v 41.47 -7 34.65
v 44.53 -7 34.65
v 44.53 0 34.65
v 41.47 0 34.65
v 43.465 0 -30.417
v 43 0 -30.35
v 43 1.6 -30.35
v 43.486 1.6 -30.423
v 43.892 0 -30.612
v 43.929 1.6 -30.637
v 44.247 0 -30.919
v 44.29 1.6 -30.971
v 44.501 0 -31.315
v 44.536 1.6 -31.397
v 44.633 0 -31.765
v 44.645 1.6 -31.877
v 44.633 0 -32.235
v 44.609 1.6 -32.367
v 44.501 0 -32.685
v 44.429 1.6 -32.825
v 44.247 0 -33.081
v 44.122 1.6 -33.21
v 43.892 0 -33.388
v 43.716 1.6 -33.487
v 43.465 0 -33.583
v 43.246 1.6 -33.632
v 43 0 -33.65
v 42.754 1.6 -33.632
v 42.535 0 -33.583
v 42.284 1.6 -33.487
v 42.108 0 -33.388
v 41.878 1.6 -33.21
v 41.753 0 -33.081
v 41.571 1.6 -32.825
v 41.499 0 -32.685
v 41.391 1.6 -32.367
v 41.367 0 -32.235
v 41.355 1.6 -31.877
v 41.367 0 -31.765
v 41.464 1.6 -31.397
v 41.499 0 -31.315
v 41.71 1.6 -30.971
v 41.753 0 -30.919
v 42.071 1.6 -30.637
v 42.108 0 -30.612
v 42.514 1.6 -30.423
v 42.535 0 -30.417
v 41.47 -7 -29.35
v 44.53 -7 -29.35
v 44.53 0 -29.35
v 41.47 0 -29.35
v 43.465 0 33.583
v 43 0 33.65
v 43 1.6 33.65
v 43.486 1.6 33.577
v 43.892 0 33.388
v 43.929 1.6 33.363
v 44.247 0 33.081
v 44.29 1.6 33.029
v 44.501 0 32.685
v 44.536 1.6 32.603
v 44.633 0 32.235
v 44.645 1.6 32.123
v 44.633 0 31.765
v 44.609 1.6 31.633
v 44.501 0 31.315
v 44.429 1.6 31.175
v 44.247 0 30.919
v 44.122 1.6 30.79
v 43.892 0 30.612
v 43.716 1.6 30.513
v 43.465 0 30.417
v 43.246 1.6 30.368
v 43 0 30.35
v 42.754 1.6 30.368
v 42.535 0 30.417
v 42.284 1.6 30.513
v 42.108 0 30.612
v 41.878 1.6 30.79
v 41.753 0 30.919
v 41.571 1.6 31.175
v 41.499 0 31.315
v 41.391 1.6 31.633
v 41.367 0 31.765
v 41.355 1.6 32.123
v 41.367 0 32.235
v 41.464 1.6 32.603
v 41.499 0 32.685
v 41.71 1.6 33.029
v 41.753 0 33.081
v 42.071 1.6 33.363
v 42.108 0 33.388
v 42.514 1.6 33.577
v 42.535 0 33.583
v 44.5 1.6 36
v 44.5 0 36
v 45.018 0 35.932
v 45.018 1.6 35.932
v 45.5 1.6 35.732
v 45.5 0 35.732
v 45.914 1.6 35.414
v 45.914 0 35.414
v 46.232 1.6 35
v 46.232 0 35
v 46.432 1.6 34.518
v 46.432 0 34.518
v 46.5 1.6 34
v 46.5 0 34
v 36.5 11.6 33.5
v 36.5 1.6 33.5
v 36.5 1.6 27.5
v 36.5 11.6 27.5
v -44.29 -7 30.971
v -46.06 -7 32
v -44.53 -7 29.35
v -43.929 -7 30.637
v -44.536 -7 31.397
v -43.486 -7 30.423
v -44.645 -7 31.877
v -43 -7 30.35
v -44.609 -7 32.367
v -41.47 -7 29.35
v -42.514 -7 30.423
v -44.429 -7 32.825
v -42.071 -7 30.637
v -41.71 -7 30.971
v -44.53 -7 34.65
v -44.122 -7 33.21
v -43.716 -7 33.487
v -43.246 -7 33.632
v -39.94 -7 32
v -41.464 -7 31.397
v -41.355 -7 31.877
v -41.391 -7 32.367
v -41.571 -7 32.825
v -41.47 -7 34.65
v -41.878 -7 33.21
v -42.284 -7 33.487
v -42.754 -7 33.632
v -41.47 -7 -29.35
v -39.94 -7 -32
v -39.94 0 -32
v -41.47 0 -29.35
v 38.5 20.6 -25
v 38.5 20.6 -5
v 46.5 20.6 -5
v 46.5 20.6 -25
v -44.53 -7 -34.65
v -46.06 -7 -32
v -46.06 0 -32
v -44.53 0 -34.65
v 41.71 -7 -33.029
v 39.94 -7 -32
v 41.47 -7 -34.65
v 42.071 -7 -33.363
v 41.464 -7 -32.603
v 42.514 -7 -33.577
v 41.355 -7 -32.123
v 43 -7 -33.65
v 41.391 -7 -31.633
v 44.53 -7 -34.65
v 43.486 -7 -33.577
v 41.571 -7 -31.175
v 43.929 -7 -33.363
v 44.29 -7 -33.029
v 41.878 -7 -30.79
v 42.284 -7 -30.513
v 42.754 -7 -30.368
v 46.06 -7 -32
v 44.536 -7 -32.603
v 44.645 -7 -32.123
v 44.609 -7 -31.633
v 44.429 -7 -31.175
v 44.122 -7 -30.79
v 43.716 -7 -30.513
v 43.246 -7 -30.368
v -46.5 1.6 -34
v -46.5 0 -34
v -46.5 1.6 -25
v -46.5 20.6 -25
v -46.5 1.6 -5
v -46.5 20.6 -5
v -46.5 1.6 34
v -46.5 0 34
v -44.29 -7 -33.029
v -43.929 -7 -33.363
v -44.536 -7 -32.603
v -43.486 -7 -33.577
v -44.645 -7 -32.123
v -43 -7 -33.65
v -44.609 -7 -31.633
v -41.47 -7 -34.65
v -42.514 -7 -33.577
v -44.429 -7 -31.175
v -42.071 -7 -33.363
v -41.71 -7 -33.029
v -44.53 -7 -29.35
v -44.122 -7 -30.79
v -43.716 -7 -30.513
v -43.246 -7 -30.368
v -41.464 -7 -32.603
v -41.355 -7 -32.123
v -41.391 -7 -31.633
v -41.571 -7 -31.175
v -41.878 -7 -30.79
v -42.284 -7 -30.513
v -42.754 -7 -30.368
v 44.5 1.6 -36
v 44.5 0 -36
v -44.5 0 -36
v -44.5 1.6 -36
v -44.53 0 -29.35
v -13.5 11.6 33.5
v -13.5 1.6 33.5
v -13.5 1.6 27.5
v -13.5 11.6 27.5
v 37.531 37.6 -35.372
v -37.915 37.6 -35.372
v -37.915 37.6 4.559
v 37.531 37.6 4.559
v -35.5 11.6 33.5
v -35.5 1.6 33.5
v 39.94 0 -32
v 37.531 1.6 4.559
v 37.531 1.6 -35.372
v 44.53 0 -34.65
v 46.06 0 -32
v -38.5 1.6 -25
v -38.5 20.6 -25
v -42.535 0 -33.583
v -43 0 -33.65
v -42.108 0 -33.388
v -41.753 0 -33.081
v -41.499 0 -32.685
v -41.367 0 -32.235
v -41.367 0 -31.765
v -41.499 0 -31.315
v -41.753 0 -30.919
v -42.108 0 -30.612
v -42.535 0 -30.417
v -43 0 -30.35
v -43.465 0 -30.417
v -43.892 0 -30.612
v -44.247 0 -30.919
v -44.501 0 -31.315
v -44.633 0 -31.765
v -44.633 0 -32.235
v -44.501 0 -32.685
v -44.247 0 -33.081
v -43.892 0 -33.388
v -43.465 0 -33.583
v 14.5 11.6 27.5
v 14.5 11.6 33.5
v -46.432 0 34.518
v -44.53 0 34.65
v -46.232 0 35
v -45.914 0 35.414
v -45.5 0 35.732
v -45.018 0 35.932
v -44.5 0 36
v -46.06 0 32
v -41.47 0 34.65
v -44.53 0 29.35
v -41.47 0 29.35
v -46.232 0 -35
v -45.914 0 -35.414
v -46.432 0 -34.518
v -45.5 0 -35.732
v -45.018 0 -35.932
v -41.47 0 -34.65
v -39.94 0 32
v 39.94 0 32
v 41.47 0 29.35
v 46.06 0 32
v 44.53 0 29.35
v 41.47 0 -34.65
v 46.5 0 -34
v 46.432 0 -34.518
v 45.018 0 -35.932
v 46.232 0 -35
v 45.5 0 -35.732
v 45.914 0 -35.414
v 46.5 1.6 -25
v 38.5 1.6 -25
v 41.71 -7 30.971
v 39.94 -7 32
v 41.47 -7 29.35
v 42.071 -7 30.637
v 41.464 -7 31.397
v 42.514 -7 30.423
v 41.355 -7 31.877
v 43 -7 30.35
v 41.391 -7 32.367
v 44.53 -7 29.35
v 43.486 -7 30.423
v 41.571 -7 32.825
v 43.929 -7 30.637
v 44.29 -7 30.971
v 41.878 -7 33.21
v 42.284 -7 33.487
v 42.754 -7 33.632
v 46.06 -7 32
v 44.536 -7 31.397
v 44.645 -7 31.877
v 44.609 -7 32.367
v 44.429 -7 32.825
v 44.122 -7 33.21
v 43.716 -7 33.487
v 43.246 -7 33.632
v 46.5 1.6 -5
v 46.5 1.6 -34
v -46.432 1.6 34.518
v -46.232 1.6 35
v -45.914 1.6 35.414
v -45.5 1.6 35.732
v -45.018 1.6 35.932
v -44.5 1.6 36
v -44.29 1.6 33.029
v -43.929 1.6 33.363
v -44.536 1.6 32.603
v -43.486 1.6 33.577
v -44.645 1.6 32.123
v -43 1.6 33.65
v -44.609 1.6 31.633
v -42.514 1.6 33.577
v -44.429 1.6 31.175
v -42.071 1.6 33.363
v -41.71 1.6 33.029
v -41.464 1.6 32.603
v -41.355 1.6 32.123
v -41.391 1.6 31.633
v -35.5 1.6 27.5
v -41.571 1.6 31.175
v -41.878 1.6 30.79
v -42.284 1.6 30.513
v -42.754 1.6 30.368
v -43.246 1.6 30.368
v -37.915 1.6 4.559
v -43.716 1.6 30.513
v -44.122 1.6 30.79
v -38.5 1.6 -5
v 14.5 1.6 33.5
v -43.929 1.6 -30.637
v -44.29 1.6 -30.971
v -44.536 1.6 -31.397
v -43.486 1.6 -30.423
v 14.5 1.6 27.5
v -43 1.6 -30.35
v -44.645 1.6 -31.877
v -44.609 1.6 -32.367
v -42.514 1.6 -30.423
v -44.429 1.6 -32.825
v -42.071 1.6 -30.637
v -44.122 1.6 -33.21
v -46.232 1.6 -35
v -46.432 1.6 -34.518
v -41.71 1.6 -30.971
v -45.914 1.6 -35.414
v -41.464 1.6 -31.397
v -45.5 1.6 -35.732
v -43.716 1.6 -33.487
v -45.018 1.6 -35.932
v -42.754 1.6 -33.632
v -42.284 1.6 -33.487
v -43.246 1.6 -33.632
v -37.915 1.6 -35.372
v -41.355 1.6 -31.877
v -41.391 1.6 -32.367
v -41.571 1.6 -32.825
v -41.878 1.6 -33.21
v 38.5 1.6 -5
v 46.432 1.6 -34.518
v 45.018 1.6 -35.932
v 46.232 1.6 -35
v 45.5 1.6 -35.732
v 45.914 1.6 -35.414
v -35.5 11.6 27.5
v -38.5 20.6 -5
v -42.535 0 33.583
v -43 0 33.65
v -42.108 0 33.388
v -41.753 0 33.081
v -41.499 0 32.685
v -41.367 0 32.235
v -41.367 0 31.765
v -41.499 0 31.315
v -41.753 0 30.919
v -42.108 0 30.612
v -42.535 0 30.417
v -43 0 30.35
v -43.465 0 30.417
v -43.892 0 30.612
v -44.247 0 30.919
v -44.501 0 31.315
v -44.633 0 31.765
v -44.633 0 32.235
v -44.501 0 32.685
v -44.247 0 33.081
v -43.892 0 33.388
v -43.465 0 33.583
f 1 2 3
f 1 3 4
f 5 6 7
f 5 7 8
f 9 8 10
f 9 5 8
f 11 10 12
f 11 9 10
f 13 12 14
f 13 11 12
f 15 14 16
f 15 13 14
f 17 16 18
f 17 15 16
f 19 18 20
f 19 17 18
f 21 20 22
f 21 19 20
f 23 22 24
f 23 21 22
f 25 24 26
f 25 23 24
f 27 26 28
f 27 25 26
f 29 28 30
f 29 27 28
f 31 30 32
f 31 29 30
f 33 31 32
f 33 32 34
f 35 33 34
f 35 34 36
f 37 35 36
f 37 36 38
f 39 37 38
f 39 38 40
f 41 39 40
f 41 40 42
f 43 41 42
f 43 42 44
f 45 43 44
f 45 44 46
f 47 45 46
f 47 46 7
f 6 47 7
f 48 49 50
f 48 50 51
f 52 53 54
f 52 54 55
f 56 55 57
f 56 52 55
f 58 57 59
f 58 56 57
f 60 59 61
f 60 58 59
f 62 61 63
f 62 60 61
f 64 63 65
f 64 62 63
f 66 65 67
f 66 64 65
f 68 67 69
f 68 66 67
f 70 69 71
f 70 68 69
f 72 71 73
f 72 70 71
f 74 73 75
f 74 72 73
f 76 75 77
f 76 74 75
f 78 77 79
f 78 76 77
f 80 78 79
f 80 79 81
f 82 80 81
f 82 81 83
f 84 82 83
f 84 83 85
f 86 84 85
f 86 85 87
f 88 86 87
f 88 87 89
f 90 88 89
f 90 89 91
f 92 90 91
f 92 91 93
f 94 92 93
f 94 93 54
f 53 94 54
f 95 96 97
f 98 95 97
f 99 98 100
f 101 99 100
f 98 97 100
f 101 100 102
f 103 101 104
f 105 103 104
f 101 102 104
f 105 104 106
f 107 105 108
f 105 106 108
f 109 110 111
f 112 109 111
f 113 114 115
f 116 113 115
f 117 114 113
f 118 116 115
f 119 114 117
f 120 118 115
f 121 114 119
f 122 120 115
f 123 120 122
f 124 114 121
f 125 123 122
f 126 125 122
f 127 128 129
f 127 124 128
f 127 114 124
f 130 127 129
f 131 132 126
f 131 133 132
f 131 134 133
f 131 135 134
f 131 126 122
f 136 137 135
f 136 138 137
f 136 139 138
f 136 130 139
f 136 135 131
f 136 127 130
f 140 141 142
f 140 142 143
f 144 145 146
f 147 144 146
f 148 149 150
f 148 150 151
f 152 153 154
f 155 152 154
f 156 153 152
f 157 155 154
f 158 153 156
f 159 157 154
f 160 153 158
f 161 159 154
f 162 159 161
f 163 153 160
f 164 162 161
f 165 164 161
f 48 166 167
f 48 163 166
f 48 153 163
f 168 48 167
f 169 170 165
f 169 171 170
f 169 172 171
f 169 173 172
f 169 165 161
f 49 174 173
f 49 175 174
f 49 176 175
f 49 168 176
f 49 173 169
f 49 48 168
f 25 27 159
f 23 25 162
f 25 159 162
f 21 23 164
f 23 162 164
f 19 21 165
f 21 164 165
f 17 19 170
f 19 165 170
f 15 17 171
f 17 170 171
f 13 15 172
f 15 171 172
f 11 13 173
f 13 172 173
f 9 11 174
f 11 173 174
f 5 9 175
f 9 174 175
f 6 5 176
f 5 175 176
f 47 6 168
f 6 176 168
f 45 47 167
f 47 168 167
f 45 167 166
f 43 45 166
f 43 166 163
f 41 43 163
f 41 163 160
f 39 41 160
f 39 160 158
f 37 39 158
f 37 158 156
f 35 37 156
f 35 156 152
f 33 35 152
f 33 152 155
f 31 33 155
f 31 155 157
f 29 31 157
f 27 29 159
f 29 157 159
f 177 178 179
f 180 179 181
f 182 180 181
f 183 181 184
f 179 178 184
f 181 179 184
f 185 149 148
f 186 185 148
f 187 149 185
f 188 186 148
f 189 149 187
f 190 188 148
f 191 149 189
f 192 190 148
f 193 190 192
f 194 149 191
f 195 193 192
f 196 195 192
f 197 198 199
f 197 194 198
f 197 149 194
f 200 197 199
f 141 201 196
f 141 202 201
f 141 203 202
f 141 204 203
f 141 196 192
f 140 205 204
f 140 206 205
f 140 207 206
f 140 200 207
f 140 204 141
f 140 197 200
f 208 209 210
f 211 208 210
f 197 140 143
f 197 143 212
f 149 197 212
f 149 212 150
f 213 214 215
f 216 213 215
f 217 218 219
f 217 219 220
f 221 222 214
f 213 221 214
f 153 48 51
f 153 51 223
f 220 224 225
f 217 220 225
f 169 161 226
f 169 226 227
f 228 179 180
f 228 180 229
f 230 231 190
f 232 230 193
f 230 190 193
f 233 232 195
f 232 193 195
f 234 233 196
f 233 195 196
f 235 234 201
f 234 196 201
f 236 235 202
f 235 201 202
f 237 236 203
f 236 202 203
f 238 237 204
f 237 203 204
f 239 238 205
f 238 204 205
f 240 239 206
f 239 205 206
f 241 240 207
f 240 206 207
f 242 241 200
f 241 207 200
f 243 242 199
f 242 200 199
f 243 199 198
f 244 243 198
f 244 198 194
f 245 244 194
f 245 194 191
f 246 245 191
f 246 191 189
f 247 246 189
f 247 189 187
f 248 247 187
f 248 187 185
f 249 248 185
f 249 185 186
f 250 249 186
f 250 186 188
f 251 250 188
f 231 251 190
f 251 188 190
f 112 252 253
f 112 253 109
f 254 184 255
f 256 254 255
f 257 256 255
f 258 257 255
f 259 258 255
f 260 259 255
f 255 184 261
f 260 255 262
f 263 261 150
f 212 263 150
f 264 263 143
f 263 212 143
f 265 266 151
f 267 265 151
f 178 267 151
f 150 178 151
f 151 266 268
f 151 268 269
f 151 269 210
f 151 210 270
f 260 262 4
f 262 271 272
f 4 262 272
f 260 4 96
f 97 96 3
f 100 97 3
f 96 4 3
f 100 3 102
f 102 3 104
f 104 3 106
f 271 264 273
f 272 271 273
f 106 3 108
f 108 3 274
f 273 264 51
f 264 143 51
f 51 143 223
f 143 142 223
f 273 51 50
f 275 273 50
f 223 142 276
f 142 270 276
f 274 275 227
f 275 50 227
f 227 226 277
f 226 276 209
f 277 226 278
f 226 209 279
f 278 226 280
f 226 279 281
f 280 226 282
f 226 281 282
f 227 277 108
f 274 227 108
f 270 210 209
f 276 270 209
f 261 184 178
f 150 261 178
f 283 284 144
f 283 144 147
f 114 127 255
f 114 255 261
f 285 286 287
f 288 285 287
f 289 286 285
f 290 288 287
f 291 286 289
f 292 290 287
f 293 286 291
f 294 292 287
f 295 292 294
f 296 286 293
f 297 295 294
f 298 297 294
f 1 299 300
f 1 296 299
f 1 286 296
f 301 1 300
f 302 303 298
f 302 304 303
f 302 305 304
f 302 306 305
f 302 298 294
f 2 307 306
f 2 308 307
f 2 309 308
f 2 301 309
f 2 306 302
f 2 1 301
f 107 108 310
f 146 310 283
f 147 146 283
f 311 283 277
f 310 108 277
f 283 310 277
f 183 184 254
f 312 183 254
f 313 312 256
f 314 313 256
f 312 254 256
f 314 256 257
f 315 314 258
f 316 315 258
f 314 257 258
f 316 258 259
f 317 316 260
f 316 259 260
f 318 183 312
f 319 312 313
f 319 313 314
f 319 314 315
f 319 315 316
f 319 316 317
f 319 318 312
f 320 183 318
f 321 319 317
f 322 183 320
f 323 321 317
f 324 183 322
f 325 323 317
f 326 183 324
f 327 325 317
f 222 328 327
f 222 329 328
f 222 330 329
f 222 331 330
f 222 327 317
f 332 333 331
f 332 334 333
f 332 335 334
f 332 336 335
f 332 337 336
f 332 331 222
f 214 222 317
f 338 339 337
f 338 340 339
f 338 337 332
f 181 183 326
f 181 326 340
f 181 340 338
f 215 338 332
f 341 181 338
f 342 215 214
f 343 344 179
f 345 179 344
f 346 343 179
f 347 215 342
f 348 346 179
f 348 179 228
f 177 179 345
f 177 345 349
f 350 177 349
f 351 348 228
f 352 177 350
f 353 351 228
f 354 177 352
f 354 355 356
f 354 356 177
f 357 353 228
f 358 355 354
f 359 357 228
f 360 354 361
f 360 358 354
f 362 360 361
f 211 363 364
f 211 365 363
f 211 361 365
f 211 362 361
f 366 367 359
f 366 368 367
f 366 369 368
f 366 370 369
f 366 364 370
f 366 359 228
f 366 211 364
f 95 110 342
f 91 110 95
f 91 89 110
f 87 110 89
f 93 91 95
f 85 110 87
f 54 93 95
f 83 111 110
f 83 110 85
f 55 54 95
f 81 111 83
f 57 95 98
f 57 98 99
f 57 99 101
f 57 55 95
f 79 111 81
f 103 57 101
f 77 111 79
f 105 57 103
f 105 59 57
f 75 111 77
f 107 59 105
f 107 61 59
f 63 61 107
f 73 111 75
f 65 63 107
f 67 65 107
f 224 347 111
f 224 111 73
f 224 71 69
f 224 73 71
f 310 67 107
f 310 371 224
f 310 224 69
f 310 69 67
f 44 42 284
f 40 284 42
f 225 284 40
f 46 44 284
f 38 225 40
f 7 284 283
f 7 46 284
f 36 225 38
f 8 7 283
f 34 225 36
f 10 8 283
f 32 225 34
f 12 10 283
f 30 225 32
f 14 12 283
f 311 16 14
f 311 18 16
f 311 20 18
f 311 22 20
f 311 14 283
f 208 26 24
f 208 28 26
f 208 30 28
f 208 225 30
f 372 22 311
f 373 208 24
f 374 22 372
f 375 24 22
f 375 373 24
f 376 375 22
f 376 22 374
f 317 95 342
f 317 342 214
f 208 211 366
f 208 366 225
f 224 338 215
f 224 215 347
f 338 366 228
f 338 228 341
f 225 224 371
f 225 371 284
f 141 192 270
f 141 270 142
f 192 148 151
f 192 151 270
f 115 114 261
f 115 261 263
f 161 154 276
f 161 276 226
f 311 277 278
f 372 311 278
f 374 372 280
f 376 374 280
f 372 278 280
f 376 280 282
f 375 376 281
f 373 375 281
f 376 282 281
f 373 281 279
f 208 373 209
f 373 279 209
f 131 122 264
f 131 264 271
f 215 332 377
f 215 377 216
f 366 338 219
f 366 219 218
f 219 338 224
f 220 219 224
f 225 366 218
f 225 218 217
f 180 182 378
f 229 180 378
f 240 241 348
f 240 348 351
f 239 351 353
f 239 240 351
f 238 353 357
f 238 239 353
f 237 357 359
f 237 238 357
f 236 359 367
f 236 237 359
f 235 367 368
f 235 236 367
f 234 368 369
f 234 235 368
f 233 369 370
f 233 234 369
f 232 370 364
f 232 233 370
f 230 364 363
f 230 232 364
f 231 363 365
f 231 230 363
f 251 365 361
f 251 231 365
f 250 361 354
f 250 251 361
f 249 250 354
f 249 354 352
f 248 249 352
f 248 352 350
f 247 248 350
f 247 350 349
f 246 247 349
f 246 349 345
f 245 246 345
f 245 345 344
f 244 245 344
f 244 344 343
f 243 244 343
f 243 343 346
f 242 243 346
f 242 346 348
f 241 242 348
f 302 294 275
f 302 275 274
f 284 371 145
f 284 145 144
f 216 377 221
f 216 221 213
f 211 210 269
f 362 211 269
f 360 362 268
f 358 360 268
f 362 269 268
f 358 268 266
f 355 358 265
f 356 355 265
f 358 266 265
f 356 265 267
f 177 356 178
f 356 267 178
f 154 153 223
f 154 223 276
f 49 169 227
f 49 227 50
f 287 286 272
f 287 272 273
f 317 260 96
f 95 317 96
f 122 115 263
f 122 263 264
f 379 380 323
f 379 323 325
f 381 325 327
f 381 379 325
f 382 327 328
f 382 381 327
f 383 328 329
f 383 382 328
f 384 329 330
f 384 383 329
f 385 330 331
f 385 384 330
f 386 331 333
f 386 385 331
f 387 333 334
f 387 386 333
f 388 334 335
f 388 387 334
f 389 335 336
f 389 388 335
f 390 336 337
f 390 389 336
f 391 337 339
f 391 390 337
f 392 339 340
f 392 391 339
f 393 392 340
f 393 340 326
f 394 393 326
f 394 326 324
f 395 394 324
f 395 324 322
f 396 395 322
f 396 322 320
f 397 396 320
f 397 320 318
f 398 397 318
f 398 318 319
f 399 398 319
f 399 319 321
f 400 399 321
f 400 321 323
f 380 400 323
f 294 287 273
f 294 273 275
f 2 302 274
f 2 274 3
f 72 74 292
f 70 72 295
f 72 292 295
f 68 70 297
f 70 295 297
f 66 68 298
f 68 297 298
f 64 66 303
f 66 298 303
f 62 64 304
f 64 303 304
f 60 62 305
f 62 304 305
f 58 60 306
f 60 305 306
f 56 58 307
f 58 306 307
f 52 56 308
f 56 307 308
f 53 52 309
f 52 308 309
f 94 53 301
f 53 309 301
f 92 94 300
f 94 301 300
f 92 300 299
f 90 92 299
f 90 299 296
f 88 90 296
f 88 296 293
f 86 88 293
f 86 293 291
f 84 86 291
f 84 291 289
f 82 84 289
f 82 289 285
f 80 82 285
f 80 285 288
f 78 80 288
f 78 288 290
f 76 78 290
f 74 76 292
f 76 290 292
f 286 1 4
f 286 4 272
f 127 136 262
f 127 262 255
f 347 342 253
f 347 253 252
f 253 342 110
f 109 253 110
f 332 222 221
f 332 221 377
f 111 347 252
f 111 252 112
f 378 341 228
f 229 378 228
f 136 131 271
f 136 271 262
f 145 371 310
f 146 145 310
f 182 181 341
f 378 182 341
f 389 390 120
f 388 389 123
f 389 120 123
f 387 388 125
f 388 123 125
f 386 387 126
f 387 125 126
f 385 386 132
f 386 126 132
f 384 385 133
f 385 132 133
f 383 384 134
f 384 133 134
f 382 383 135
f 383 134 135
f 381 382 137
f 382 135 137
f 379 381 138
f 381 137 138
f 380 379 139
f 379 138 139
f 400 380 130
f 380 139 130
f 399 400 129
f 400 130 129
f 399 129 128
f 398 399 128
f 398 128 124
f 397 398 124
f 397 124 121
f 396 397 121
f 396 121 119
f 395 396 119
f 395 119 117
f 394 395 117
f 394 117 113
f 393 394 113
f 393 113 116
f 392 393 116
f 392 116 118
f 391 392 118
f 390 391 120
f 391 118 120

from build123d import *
from build123d.topology import SkipClean

# Parameters (mm, degrees)
SKETCH_1_R      = 1.65
EXTRUDE_1_DEPTH = 1.6
SKETCH_2_W      = 22
SKETCH_2_H      = 6
EXTRUDE_2_DEPTH = 10
SKETCH_3_W      = 75.446569178
SKETCH_3_H      = 39.931008624
EXTRUDE_3_DEPTH = 36
SKETCH_4_W      = 8
SKETCH_4_H      = 20
EXTRUDE_4_DEPTH = 19
EXTRUDE_START   = 7
SKETCH_5_R      = 1.65
EXTRUDE_5_DEPTH = 7


with BuildPart() as part:
    # 草图1 → 凸台-拉伸1 (new body)
    with BuildSketch(Plane(origin=(0, 0, 0), x_dir=(1, 0, 0), z_dir=(0, 1, 0))):
        with BuildLine():
            Line((-44.5, -36), (44.5, -36))
            ThreePointArc((44.5, -36), (45.914213562, -35.414213562), (46.5, -34))
            Line((46.5, -34), (46.5, 34))
            ThreePointArc((46.5, 34), (45.914213562, 35.414213562), (44.5, 36))
            Line((44.5, 36), (-44.5, 36))
            ThreePointArc((-44.5, 36), (-45.914213562, 35.414213562), (-46.5, 34))
            Line((-46.5, 34), (-46.5, -34))
            ThreePointArc((-46.5, -34), (-45.914213562, -35.414213562), (-44.5, -36))
        make_face()
        with Locations(Location((-43, 32, 0), (0, 0, 270))):
            Circle(SKETCH_1_R, mode=Mode.SUBTRACT)
        with Locations(Location((43, 32, 0), (0, 0, 270))):
            Circle(SKETCH_1_R, mode=Mode.SUBTRACT)
        with Locations(Location((43, -32, 0), (0, 0, 270))):
            Circle(SKETCH_1_R, mode=Mode.SUBTRACT)
        with Locations(Location((-43, -32, 0), (0, 0, 270))):
            Circle(SKETCH_1_R, mode=Mode.SUBTRACT)
    extrude(amount=EXTRUDE_1_DEPTH)

    # 草图2 → 凸台-拉伸2 (add)
    with BuildSketch(Plane(origin=(0, 1.6, 0), x_dir=(1, 0, 0), z_dir=(0, 1, 0))):
        with Locations((-24.5, -30.5)):
            Rectangle(SKETCH_2_W, SKETCH_2_H)
        with Locations((25.5, -30.5)):
            Rectangle(SKETCH_2_W, SKETCH_2_H)
    extrude(amount=EXTRUDE_2_DEPTH)

    # 草图3 → 凸台-拉伸3 (add)
    with BuildSketch(Plane(origin=(0, 1.6, 0), x_dir=(1, 0, 0), z_dir=(0, 1, 0))):
        with Locations((-0.191976003, 15.406074241)):
            Rectangle(SKETCH_3_W, SKETCH_3_H)
    extrude(amount=EXTRUDE_3_DEPTH)

    # 草图4 → 凸台-拉伸4 (add)
    with BuildSketch(Plane(origin=(0, 1.6, 0), x_dir=(1, 0, 0), z_dir=(0, 1, 0))):
        with Locations((-42.5, 15)):
            Rectangle(SKETCH_4_W, SKETCH_4_H)
        with Locations((42.5, 15)):
            Rectangle(SKETCH_4_W, SKETCH_4_H)
    extrude(amount=EXTRUDE_4_DEPTH)

    # 草图5 → 凸台-拉伸5 (add)
    # profile 1 of 4: a face of its own
    with SkipClean():  # the faces are left unmerged after this step: merging them gives an invalid solid
        with BuildSketch(Plane.XZ.offset(EXTRUDE_START)):
            Polygon((39.940043573, -32), (41.470021787, -34.65), (44.529978213, -34.65), (46.059956427, -32), (44.529978213, -29.35), (41.470021787, -29.35), align=None)
            with Locations(Location((43, -32, 0), (0, 0, 270))):
                Circle(SKETCH_5_R, mode=Mode.SUBTRACT)
        # profile 2 of 4: a face of its own
        with BuildSketch(Plane.XZ.offset(EXTRUDE_START)):
            Polygon((-39.940043573, -32), (-41.470021787, -29.35), (-44.529978213, -29.35), (-46.059956427, -32), (-44.529978213, -34.65), (-41.470021787, -34.65), align=None)
            with Locations(Location((-43, -32, 0), (0, 0, 270))):
                Circle(SKETCH_5_R, mode=Mode.SUBTRACT)
        # profile 3 of 4: a face of its own
        with BuildSketch(Plane.XZ.offset(EXTRUDE_START)):
            Polygon((-39.940043573, 32), (-41.470021787, 34.65), (-44.529978213, 34.65), (-46.059956427, 32), (-44.529978213, 29.35), (-41.470021787, 29.35), align=None)
            with Locations(Location((-43, 32, 0), (0, 0, 270))):
                Circle(SKETCH_5_R, mode=Mode.SUBTRACT)
        # profile 4 of 4: a face of its own
        with BuildSketch(Plane.XZ.offset(EXTRUDE_START)):
            Polygon((39.940043573, 32), (41.470021787, 29.35), (44.529978213, 29.35), (46.059956427, 32), (44.529978213, 34.65), (41.470021787, 34.65), align=None)
            with Locations(Location((43, 32, 0), (0, 0, 270))):
                Circle(SKETCH_5_R, mode=Mode.SUBTRACT)
        extrude(amount=-EXTRUDE_5_DEPTH)


solid = part.part
